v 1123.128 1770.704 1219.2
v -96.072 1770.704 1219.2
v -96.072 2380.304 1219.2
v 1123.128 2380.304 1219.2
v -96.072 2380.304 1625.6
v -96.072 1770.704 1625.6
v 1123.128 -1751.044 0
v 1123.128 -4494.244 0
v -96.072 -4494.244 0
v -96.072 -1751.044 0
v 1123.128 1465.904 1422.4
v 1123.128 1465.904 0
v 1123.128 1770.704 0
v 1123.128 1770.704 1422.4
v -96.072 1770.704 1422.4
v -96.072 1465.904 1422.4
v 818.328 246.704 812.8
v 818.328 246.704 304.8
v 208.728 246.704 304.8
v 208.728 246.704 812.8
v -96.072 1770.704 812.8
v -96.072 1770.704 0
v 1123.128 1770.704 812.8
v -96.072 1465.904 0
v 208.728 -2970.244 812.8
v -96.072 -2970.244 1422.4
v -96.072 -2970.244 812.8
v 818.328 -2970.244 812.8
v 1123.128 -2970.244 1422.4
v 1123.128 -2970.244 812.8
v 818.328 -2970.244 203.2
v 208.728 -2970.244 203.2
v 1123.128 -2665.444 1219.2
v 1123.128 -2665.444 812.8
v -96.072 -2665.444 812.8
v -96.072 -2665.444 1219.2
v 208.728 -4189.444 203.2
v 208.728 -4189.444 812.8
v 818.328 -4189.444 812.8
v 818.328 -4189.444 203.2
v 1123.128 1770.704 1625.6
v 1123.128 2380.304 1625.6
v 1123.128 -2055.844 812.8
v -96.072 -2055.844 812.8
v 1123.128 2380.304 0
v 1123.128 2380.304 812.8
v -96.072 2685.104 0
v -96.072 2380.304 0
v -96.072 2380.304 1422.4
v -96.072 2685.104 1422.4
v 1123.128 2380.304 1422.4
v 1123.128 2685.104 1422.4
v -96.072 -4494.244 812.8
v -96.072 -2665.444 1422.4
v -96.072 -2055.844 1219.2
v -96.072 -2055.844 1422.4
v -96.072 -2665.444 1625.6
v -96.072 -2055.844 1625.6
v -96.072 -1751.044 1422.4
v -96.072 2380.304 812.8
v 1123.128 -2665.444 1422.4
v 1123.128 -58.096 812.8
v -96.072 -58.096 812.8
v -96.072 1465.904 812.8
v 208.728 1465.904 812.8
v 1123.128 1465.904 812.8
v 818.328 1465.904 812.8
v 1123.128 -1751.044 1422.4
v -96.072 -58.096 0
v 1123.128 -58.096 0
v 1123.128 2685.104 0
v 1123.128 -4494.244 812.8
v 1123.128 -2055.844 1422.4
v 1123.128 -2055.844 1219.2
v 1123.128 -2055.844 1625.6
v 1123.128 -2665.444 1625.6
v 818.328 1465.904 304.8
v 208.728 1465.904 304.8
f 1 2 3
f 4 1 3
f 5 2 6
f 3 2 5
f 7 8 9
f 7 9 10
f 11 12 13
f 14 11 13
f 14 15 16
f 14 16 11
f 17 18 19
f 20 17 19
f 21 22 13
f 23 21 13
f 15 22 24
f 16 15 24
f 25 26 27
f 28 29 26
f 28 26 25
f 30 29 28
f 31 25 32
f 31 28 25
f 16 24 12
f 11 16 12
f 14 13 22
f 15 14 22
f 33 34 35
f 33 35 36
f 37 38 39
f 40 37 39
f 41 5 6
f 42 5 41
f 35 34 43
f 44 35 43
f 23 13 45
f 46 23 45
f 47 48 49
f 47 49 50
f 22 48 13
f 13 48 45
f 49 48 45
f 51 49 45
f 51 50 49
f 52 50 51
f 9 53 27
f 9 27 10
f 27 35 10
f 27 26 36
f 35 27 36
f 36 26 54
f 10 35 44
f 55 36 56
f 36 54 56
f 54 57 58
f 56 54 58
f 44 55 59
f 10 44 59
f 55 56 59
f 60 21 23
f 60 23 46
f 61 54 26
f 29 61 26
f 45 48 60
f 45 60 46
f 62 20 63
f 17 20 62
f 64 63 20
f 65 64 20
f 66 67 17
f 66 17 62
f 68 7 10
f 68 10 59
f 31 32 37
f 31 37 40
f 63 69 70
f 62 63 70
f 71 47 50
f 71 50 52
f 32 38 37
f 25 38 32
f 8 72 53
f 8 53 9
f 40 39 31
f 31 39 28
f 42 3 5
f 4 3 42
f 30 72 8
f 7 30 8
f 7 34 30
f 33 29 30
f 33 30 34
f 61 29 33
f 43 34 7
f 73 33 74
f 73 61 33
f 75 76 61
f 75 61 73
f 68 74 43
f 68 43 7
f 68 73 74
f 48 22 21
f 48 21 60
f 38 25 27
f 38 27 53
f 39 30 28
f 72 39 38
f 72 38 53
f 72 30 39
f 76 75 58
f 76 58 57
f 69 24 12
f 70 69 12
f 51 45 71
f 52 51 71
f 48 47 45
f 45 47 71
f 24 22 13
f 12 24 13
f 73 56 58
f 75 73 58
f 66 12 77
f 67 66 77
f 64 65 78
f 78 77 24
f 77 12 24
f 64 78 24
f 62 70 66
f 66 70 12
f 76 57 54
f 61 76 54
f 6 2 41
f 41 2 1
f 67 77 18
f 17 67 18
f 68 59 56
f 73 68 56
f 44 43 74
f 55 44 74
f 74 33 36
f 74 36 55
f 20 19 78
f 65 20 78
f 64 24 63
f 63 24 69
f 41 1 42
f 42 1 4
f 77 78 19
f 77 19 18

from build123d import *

# Parameters (mm, degrees)
F0_W      = 609.6
F0_H      = 1219.2
F1_DEPTH  = 304.8
F2_DEPTH  = 812.8
F0_W_2    = 1219.2
F0_H_2    = 304.8
F3_DEPTH  = 1422.4
F0_H_3    = 609.6
F4_DEPTH  = 1625.6
F5_W      = 609.6
F5_H      = 406.4
F6_DEPTH  = 1219.201
F7_W      = 609.6
F7_H      = 406.4
F8_DEPTH  = 1219.2
F9_W      = 609.6
F9_H      = 1219.2
F10_DEPTH = 609.6


with BuildPart() as f1:
    # F0 (on Top) → F1 (new body)
    with BuildSketch(Plane.XY):
        with Locations((513.527751, 856.304496)):
            Rectangle(F0_W, F0_H)
    extrude(amount=F1_DEPTH)

    # F0 (on Top) → F2 (join)
    with BuildSketch(Plane.XY):
        Polygon((-96.072249, 1465.904496), (-96.072249, -58.095504), (1123.127751, -58.095504), (1123.127751, 1465.904496), (818.327751, 1465.904496), (818.327751, 246.704496), (208.727751, 246.704496), (208.727751, 1465.904496), align=None)
    extrude(amount=F2_DEPTH)


with BuildPart() as f3:
    # F0 (on Top) → F3 (new body)
    with BuildSketch(Plane.XY):
        Polygon((-96.072249, 1770.704496), (-96.072249, 1465.904496), (208.727751, 1465.904496), (818.327751, 1465.904496), (1123.127751, 1465.904496), (1123.127751, 1770.704496), align=None)
        with Locations((513.527751, 2532.704496)):
            Rectangle(F0_W_2, F0_H_2)
    extrude(amount=F3_DEPTH)


with BuildPart() as f4:
    # F0 (on Top) → F4 (new body)
    with BuildSketch(Plane.XY):
        with Locations((513.527751, 2075.504496)):
            Rectangle(F0_W_2, F0_H_3)
    extrude(amount=F4_DEPTH)

    # F5 (on face) → F6 (cut, through all)
    with BuildSketch(Plane.YZ.offset(1123.127751)):
        with Locations((2075.504496, 1016)):
            Rectangle(F5_W, F5_H)
    extrude(amount=-F6_DEPTH, mode=Mode.SUBTRACT)


with BuildPart() as f8:
    # F7 (on face) → F8 (new body)
    with BuildSketch(Plane.YZ.offset(1123.127751)):
        Polygon((-4494.243622, 812.8), (-4494.243622, 0), (-1751.043622, 0), (-1751.043622, 1422.4), (-2055.843622, 1422.4), (-2055.843622, 1625.6), (-2665.443622, 1625.6), (-2665.443622, 1422.4), (-2970.243622, 1422.4), (-2970.243622, 812.8), align=None)
        with Locations((-2360.643622, 1016)):
            Rectangle(F7_W, F7_H, mode=Mode.SUBTRACT)
    extrude(amount=-F8_DEPTH)

    # F9 (on face) → F10 (cut)
    with BuildSketch(Plane.XY.offset(812.8)):
        with Locations((513.527751, -3579.843622)):
            Rectangle(F9_W, F9_H)
    extrude(amount=-F10_DEPTH, mode=Mode.SUBTRACT)


solid = Compound([f1.part, f3.part, f4.part, f8.part])
